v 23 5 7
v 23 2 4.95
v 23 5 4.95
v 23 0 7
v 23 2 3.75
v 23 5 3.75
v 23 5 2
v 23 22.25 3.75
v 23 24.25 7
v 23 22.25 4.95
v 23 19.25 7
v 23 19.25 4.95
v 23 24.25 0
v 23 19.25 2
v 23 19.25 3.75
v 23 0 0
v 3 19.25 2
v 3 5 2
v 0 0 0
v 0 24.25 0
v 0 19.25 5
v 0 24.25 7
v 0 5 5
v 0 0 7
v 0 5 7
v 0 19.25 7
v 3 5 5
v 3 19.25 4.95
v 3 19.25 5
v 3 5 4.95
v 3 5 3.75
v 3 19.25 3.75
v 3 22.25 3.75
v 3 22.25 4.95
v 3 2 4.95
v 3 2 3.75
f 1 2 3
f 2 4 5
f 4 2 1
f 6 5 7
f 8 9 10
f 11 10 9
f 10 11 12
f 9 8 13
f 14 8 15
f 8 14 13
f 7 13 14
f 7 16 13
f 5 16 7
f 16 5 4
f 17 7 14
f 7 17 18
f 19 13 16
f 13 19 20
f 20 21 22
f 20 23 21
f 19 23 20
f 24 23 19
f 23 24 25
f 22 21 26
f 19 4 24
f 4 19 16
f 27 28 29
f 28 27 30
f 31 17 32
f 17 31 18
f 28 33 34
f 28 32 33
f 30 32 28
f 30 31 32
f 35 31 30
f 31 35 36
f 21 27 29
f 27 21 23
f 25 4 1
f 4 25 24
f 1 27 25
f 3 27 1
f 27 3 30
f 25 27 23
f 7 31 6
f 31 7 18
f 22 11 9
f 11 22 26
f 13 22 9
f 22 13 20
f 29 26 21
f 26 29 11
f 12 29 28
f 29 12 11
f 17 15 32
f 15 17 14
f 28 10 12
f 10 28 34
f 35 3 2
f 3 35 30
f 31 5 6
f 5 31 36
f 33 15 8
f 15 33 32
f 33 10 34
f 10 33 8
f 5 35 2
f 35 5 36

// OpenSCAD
length = 23;

difference(){
union(){
//base
cube([length,23,2]);

//back
cube([3,23,5]);

cube([length, 5, 7]);

translate(v = [0,19.25,0]) {
cube([length, 5, 7]);
}
}

translate(v = [3,2,3.75]) {
cube([length, 20.25,1.2]);
 }
 
 }
